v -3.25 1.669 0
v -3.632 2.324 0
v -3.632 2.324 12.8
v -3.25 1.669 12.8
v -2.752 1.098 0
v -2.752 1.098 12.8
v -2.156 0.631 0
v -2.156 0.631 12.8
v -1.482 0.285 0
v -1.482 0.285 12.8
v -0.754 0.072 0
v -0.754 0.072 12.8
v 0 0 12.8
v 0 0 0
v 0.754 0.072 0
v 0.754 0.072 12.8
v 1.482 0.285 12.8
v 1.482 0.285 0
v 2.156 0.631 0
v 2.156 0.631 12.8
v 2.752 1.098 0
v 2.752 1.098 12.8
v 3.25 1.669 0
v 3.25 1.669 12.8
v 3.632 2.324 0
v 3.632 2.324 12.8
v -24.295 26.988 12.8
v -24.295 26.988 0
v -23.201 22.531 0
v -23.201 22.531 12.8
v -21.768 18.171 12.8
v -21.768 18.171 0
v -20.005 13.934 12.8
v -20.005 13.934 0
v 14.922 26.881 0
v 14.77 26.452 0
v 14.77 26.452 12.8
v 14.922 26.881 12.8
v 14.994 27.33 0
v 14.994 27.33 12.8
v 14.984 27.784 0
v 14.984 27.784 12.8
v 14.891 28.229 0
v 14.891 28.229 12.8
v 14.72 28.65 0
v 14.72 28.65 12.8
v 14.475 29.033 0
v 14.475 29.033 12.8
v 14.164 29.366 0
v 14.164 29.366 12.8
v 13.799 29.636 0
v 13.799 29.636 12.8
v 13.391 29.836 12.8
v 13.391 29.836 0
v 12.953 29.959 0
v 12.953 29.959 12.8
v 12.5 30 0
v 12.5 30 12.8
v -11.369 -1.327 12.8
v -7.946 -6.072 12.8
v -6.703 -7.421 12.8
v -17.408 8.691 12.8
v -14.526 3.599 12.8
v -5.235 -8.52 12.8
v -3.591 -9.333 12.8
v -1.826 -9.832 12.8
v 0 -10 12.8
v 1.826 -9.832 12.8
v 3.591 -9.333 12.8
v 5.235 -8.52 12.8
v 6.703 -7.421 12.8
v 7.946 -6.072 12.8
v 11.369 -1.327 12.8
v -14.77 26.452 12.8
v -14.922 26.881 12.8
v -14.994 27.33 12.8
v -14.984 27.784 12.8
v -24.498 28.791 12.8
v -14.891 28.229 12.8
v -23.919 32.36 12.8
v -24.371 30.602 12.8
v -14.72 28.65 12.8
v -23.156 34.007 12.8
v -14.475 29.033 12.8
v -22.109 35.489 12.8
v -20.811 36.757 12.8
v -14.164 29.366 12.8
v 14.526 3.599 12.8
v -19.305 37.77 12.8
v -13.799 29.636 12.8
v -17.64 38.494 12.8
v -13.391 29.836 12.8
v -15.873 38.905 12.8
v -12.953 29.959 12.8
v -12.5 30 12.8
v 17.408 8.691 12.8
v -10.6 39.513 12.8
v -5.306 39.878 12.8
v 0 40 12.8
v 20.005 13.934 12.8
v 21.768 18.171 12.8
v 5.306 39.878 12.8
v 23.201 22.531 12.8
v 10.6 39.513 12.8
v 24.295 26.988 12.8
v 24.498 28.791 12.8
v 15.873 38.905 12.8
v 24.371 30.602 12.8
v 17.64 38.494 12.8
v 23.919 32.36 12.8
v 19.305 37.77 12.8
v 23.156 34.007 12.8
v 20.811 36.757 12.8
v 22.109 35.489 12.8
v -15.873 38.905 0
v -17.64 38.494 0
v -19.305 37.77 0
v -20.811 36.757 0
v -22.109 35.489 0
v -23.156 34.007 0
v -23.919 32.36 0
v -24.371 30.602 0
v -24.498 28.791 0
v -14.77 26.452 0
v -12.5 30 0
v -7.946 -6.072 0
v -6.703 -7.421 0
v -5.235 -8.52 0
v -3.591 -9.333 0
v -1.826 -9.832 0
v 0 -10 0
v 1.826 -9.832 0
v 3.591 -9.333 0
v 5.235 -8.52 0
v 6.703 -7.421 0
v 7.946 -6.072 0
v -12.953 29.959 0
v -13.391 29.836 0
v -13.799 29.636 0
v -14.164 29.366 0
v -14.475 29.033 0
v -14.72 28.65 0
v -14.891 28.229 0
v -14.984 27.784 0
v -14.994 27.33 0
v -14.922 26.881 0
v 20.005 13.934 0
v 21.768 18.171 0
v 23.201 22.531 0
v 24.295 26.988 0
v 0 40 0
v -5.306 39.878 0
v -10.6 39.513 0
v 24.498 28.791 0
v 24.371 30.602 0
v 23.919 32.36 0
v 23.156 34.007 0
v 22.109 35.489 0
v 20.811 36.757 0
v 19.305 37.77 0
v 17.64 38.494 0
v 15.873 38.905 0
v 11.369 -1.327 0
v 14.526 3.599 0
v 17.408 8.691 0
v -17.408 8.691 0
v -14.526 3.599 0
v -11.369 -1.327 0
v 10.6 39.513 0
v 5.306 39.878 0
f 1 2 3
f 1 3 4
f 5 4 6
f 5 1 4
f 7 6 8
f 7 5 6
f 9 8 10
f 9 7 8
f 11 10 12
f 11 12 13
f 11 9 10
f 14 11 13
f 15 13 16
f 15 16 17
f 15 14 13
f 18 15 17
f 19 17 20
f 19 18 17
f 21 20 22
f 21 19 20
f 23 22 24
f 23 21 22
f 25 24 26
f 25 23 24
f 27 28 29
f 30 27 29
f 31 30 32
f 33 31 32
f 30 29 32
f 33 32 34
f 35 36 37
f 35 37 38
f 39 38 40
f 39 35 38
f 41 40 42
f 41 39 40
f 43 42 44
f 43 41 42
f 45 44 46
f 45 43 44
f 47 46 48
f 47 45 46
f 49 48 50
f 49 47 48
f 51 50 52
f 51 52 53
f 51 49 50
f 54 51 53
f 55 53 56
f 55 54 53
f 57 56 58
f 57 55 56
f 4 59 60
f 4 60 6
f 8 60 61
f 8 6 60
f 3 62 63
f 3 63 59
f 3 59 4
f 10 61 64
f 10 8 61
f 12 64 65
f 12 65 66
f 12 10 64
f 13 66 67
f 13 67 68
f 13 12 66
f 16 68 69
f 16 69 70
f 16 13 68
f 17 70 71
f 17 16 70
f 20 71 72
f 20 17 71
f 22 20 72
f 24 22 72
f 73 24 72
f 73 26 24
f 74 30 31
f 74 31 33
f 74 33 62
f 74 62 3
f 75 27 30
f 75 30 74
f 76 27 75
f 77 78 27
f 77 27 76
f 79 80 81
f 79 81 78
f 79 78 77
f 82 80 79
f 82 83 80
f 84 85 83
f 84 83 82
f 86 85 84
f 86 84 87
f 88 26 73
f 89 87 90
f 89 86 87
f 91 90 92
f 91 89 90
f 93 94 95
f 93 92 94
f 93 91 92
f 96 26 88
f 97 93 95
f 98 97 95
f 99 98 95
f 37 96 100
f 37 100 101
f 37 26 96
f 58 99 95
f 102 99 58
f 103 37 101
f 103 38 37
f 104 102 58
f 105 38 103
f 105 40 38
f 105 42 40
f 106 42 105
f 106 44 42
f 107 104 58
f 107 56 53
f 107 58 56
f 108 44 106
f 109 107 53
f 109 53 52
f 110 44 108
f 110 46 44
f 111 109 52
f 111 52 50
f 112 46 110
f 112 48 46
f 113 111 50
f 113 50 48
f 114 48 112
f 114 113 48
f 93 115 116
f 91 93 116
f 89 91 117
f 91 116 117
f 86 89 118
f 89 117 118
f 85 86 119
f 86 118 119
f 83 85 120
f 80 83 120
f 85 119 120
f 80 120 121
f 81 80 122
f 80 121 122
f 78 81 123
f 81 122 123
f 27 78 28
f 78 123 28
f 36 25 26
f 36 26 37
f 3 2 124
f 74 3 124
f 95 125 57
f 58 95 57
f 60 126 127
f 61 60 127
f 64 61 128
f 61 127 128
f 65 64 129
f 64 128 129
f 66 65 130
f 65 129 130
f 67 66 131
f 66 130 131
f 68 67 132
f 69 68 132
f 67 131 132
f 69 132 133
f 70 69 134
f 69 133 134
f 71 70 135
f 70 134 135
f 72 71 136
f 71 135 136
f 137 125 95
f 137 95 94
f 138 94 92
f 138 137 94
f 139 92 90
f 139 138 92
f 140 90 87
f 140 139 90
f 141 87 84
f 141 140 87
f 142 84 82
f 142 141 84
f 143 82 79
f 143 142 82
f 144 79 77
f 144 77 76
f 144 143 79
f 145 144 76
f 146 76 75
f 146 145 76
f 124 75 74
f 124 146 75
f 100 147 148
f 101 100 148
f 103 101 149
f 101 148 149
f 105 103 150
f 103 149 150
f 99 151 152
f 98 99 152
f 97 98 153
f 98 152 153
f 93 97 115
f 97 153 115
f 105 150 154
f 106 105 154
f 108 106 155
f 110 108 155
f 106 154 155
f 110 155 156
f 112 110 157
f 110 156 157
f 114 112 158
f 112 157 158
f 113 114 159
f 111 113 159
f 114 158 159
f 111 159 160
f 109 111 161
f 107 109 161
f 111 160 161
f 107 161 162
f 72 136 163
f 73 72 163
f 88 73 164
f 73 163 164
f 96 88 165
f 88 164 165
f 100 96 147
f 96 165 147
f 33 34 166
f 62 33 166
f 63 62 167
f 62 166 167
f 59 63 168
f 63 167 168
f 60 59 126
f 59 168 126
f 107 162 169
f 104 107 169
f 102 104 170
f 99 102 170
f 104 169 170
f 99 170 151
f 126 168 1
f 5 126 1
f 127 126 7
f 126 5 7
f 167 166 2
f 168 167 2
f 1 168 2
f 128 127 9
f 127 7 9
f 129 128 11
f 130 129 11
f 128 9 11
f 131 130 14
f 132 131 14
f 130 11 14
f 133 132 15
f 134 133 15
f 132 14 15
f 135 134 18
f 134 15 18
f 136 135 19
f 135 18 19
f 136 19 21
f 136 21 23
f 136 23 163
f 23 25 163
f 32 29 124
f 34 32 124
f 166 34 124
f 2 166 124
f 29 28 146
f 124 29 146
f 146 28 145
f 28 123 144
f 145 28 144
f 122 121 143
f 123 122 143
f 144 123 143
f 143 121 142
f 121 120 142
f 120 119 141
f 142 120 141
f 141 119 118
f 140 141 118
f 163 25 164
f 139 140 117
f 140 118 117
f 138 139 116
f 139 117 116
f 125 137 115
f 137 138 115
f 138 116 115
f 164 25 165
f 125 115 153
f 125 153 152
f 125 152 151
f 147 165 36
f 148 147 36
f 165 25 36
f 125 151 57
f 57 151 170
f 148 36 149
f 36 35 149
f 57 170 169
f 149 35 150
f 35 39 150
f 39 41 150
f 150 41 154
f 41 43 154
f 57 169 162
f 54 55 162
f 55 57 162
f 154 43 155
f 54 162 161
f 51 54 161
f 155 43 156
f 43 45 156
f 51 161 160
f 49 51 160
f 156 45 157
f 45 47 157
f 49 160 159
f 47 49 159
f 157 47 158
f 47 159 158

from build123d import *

# Parameters (mm, degrees)
PAD_DEPTH = 12.8


with BuildPart() as part:
    # Sketch → Pad (new body)
    with BuildSketch(Plane.XY):
        with BuildLine():
            ThreePointArc((-24.295471, 26.987861), (-22.525854, 20.33745), (-20.005224, 13.933863))
            ThreePointArc((-20.005224, 13.933863), (-14.526243, 3.599075), (-7.945722, -6.071697))
            ThreePointArc((-7.945722, -6.071697), (0, -10), (7.945722, -6.071697))
            ThreePointArc((7.945722, -6.071697), (14.526243, 3.599075), (20.005224, 13.933863))
            ThreePointArc((20.005224, 13.933863), (22.525853, 20.337445), (24.295472, 26.98785))
            ThreePointArc((24.295472, 26.98785), (22.666335, 34.771566), (15.872783, 38.905324))
            ThreePointArc((15.872783, 38.905324), (7.955243, 39.726006), (0, 40))
            ThreePointArc((0, 40), (-7.955239, 39.726008), (-15.872775, 38.905329))
            ThreePointArc((-15.872775, 38.905329), (-22.666329, 34.771574), (-24.295471, 26.987861))
        make_face()
        with BuildLine():
            Line((3.631735, 2.323545), (14.769834, 26.452216))
            ThreePointArc((14.769834, 26.452216), (14.60588, 28.847319), (12.5, 30))
            Line((-12.5, 30), (12.5, 30))
            ThreePointArc((-12.5, 30), (-14.60588, 28.847319), (-14.769834, 26.452216))
            Line((-3.631735, 2.323545), (-14.769834, 26.452216))
            ThreePointArc((-3.631735, 2.323545), (0, 0), (3.631735, 2.323545))
        make_face(mode=Mode.SUBTRACT)
    extrude(amount=PAD_DEPTH)


solid = part.part
